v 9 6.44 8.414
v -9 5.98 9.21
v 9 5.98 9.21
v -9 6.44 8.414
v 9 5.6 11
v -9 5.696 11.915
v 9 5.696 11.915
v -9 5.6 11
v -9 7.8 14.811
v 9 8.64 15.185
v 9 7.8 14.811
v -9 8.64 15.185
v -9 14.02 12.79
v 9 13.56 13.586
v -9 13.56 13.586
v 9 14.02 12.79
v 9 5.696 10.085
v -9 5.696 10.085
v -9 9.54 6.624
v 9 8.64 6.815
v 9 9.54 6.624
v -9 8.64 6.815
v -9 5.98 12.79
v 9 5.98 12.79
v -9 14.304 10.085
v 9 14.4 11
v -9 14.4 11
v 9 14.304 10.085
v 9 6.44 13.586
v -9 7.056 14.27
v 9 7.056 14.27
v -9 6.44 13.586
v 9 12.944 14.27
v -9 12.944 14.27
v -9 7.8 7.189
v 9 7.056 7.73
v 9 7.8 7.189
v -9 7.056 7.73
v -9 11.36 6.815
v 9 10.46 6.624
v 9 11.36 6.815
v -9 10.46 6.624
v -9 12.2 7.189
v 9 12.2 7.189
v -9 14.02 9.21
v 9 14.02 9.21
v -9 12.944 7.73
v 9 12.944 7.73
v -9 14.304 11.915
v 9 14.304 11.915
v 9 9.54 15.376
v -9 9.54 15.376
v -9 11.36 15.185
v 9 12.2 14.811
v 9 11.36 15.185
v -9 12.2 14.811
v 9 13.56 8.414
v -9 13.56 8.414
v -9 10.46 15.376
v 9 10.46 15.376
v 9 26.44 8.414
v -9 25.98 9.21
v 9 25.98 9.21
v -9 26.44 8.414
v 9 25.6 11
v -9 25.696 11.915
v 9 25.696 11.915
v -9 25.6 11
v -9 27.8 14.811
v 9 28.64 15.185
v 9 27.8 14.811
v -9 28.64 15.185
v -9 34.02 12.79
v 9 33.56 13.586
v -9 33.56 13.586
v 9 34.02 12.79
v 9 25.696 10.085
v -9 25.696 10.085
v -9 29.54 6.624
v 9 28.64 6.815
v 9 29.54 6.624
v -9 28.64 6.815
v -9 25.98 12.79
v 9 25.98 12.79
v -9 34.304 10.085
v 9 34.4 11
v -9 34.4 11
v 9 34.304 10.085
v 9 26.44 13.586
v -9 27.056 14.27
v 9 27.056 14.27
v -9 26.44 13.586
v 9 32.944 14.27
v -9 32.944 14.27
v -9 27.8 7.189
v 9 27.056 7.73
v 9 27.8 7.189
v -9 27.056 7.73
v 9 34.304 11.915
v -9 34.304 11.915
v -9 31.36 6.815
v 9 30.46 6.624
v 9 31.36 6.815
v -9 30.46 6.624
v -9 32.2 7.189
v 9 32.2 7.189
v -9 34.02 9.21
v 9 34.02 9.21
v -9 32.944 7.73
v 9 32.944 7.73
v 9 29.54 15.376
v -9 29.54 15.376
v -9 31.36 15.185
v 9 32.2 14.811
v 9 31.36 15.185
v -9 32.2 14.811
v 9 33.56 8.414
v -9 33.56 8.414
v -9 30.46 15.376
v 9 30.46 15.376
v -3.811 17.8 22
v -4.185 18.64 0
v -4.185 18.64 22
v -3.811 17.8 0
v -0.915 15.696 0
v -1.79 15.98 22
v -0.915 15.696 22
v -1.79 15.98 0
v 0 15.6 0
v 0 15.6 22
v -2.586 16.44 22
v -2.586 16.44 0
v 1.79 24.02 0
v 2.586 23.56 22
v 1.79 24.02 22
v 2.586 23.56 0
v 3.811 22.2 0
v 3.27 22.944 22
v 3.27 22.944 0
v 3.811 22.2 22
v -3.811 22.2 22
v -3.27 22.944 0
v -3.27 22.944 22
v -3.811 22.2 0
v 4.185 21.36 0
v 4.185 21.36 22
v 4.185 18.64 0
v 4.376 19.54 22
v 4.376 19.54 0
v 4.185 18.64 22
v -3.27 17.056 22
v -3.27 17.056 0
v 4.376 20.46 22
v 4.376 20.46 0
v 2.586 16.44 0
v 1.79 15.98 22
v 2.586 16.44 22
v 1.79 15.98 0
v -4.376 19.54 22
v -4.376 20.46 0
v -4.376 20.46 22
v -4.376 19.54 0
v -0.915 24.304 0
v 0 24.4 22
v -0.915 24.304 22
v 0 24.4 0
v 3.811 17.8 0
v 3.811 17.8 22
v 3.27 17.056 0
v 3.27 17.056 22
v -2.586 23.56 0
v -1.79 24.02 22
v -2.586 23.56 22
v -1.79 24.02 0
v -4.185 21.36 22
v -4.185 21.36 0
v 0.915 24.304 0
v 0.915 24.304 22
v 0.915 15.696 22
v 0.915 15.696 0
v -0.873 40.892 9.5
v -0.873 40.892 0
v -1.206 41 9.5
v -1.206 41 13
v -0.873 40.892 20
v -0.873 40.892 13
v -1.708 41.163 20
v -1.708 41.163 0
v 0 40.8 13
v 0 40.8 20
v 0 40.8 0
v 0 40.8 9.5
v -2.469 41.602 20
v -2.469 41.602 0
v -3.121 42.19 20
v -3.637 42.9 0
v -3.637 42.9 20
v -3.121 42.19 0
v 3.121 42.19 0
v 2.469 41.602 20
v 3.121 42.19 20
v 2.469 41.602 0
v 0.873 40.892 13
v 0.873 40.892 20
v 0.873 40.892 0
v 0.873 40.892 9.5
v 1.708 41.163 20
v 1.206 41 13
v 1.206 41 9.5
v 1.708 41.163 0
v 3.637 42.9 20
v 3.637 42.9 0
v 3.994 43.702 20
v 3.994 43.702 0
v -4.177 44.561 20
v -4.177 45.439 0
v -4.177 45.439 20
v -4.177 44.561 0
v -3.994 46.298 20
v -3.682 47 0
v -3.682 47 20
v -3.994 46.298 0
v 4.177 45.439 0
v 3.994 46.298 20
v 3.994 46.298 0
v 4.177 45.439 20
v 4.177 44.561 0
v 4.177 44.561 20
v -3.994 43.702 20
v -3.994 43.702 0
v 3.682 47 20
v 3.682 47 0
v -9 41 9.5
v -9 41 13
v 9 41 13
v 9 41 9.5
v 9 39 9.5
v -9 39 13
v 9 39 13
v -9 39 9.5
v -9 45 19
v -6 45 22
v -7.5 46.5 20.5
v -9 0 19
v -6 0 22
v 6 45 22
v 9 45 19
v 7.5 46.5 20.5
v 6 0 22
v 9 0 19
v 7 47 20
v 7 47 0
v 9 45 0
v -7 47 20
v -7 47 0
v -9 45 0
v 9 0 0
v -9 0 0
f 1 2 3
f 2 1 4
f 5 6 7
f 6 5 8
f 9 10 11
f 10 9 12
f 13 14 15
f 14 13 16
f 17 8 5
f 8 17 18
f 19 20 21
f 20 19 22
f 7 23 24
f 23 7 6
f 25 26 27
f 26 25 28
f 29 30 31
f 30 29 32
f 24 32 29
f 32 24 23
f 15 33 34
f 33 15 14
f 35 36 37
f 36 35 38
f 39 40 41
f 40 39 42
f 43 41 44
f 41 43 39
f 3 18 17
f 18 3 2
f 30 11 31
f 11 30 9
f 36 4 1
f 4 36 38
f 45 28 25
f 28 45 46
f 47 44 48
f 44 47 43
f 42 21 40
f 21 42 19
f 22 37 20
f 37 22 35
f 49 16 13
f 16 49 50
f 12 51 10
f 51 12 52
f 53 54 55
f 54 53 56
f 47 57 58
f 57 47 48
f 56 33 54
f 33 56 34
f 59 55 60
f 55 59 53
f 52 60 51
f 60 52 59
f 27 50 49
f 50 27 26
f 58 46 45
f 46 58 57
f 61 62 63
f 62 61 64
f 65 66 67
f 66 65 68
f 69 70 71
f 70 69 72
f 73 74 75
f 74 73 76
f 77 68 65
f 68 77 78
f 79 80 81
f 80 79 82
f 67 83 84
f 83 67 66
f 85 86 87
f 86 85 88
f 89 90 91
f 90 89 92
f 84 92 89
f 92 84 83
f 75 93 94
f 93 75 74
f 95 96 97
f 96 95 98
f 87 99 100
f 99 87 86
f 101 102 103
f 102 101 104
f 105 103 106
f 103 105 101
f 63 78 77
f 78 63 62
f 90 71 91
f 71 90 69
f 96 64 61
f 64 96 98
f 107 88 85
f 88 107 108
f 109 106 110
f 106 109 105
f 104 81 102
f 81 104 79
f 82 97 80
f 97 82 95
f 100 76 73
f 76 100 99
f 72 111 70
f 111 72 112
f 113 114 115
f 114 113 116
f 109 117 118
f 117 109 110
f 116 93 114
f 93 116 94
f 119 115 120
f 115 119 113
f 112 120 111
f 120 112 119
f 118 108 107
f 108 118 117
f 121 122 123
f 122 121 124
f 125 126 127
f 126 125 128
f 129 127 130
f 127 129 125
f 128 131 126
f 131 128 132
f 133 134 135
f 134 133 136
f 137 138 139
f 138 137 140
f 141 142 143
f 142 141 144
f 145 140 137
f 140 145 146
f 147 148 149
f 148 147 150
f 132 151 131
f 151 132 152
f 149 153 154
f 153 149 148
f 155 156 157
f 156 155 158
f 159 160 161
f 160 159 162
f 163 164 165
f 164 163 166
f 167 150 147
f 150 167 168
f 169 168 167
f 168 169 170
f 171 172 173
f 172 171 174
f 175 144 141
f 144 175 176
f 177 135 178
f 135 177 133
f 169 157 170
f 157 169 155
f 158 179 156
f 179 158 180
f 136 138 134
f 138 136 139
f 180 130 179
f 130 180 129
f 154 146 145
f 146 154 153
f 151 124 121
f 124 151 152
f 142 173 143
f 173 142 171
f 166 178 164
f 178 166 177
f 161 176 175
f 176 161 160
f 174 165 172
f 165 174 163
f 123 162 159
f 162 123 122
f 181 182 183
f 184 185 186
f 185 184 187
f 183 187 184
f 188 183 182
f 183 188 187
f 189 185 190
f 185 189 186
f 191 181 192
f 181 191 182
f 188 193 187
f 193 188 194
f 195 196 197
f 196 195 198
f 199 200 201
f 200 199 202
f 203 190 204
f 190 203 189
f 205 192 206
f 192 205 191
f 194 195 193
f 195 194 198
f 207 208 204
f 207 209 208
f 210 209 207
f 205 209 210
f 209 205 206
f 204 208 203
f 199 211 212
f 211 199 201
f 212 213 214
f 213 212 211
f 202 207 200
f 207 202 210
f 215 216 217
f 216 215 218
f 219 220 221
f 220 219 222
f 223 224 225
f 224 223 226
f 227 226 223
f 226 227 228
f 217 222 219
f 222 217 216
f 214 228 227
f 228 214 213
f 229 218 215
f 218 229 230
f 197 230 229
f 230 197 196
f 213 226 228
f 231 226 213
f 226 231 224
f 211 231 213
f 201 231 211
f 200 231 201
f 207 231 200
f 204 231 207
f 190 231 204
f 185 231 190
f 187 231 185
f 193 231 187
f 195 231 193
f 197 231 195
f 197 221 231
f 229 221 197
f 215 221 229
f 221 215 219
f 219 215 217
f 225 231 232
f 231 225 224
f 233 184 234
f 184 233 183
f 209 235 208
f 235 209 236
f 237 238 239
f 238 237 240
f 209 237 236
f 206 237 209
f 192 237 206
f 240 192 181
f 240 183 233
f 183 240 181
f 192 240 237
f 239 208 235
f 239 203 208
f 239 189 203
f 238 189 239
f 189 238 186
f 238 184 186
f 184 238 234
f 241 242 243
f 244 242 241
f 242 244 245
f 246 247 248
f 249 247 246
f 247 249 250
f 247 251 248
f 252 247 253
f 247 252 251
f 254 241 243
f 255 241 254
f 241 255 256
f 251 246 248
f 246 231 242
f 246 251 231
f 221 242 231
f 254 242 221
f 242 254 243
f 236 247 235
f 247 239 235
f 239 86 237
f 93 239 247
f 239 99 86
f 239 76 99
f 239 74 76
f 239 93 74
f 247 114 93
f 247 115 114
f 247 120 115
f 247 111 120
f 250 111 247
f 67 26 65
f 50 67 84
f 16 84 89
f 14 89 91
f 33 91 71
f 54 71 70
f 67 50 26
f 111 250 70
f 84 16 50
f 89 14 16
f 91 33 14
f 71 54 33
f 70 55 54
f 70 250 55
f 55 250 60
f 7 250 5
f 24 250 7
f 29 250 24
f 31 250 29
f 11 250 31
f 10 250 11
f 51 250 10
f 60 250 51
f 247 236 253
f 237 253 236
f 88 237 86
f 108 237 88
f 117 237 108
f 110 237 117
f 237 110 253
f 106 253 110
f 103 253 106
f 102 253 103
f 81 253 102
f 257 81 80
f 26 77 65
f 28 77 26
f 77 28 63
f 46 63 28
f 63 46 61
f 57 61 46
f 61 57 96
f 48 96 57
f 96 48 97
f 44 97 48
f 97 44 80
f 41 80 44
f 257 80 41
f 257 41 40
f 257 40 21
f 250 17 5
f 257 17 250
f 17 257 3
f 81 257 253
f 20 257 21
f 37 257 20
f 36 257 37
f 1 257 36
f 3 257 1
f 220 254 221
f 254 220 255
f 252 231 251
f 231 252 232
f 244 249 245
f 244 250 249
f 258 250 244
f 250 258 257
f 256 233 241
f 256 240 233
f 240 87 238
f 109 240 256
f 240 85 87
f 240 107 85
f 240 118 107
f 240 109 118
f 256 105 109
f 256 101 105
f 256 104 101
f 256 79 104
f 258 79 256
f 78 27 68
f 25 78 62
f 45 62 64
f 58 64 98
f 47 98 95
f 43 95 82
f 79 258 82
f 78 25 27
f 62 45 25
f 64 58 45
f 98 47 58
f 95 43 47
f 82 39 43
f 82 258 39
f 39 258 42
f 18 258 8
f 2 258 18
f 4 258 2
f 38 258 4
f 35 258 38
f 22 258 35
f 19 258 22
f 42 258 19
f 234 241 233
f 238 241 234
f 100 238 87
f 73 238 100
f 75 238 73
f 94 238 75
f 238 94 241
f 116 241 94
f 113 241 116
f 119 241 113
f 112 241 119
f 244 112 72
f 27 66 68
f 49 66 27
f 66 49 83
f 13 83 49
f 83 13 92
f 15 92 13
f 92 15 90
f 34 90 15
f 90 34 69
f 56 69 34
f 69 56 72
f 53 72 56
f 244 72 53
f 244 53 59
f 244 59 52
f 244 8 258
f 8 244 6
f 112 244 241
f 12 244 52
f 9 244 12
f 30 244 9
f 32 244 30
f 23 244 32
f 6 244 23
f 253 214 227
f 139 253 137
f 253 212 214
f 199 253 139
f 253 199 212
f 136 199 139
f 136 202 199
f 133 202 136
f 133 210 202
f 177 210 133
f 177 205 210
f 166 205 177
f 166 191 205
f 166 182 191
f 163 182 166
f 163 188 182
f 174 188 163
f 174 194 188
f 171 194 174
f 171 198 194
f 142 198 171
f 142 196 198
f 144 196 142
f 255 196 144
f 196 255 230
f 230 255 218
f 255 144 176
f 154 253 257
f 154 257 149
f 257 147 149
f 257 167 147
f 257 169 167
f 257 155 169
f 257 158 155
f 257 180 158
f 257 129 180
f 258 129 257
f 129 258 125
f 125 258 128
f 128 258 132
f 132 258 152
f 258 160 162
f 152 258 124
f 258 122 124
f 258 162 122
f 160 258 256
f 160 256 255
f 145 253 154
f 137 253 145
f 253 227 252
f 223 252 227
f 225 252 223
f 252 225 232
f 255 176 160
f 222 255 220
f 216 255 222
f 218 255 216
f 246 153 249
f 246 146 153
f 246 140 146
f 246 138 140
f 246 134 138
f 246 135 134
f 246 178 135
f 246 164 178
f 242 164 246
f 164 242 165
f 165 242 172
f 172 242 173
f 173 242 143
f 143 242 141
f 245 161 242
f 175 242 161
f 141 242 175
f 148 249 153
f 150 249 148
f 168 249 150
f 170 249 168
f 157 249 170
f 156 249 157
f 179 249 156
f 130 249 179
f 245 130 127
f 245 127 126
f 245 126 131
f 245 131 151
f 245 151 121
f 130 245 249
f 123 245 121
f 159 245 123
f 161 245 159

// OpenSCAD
// PRUSA iteration3
// Y frame corners
// GNU GPL v3
// Josef Průša <iam@josefprusa.cz> and contributors
// http://www.reprap.org/wiki/Prusa_Mendel
// http://prusamendel.org


module corner_base(){	
 translate([-9,-11,0])cube([18,22,47]);
}

module corner_holes(){
 translate([-11,-11,0]){
  // Bottom hole
  translate([0,11,10]) rotate([0,90,0]) translate([0,0,-5]) cylinder(h = 270, r=4.4, $fn=30);
  // Top hole
  translate([0,11,30]) rotate([0,90,0]) translate([0,0,-5]) cylinder(h = 270, r=4.4, $fn=30);
  // Middle hole
  translate([11,0,20]) rotate([0,0,90]) rotate([0,90,0]) translate([0,0,-5]) cylinder(h = 270, r=4.4, $fn=30);

  // Top smooth rod insert
  // Smooth rod place
  translate([11,2,45]) rotate([0,90,90]) cylinder(h = 270, r=4.2, $fn=30); 
  // Ziptie
  translate([-5,9,39])  cube([30,3.5,2]);
 }
}

module corner_fancy(){
 // Side corner cutouts
  translate([-8,-9,0]) rotate([0,0,-45-180]) translate([-15,0,-1]) cube([30,30,51]);
  translate([8,-9,0]) rotate([0,0,45-180]) translate([-15,0,-1]) cube([30,30,51]);
 // Top corner cutouts
  translate([7,0,49-2]) rotate([0,45,0]) translate([-15,-15,0]) cube([30,30,30]);
  translate([-7,0,49-2]) rotate([0,-45,0]) translate([-15,-15,0]) cube([30,30,30]);
  rotate([0,0,90]){
   translate([-9,0,49-2]) rotate([0,-45,0]) translate([-15,-15,0]) cube([30,30,30]);
  }
}


// Final part
module corner(){
 // Rotate the part for better printing
 translate([0,0,11]) rotate([-90,0,0]) difference(){
  corner_base();
  corner_holes();
  corner_fancy();
 }
}

corner();
